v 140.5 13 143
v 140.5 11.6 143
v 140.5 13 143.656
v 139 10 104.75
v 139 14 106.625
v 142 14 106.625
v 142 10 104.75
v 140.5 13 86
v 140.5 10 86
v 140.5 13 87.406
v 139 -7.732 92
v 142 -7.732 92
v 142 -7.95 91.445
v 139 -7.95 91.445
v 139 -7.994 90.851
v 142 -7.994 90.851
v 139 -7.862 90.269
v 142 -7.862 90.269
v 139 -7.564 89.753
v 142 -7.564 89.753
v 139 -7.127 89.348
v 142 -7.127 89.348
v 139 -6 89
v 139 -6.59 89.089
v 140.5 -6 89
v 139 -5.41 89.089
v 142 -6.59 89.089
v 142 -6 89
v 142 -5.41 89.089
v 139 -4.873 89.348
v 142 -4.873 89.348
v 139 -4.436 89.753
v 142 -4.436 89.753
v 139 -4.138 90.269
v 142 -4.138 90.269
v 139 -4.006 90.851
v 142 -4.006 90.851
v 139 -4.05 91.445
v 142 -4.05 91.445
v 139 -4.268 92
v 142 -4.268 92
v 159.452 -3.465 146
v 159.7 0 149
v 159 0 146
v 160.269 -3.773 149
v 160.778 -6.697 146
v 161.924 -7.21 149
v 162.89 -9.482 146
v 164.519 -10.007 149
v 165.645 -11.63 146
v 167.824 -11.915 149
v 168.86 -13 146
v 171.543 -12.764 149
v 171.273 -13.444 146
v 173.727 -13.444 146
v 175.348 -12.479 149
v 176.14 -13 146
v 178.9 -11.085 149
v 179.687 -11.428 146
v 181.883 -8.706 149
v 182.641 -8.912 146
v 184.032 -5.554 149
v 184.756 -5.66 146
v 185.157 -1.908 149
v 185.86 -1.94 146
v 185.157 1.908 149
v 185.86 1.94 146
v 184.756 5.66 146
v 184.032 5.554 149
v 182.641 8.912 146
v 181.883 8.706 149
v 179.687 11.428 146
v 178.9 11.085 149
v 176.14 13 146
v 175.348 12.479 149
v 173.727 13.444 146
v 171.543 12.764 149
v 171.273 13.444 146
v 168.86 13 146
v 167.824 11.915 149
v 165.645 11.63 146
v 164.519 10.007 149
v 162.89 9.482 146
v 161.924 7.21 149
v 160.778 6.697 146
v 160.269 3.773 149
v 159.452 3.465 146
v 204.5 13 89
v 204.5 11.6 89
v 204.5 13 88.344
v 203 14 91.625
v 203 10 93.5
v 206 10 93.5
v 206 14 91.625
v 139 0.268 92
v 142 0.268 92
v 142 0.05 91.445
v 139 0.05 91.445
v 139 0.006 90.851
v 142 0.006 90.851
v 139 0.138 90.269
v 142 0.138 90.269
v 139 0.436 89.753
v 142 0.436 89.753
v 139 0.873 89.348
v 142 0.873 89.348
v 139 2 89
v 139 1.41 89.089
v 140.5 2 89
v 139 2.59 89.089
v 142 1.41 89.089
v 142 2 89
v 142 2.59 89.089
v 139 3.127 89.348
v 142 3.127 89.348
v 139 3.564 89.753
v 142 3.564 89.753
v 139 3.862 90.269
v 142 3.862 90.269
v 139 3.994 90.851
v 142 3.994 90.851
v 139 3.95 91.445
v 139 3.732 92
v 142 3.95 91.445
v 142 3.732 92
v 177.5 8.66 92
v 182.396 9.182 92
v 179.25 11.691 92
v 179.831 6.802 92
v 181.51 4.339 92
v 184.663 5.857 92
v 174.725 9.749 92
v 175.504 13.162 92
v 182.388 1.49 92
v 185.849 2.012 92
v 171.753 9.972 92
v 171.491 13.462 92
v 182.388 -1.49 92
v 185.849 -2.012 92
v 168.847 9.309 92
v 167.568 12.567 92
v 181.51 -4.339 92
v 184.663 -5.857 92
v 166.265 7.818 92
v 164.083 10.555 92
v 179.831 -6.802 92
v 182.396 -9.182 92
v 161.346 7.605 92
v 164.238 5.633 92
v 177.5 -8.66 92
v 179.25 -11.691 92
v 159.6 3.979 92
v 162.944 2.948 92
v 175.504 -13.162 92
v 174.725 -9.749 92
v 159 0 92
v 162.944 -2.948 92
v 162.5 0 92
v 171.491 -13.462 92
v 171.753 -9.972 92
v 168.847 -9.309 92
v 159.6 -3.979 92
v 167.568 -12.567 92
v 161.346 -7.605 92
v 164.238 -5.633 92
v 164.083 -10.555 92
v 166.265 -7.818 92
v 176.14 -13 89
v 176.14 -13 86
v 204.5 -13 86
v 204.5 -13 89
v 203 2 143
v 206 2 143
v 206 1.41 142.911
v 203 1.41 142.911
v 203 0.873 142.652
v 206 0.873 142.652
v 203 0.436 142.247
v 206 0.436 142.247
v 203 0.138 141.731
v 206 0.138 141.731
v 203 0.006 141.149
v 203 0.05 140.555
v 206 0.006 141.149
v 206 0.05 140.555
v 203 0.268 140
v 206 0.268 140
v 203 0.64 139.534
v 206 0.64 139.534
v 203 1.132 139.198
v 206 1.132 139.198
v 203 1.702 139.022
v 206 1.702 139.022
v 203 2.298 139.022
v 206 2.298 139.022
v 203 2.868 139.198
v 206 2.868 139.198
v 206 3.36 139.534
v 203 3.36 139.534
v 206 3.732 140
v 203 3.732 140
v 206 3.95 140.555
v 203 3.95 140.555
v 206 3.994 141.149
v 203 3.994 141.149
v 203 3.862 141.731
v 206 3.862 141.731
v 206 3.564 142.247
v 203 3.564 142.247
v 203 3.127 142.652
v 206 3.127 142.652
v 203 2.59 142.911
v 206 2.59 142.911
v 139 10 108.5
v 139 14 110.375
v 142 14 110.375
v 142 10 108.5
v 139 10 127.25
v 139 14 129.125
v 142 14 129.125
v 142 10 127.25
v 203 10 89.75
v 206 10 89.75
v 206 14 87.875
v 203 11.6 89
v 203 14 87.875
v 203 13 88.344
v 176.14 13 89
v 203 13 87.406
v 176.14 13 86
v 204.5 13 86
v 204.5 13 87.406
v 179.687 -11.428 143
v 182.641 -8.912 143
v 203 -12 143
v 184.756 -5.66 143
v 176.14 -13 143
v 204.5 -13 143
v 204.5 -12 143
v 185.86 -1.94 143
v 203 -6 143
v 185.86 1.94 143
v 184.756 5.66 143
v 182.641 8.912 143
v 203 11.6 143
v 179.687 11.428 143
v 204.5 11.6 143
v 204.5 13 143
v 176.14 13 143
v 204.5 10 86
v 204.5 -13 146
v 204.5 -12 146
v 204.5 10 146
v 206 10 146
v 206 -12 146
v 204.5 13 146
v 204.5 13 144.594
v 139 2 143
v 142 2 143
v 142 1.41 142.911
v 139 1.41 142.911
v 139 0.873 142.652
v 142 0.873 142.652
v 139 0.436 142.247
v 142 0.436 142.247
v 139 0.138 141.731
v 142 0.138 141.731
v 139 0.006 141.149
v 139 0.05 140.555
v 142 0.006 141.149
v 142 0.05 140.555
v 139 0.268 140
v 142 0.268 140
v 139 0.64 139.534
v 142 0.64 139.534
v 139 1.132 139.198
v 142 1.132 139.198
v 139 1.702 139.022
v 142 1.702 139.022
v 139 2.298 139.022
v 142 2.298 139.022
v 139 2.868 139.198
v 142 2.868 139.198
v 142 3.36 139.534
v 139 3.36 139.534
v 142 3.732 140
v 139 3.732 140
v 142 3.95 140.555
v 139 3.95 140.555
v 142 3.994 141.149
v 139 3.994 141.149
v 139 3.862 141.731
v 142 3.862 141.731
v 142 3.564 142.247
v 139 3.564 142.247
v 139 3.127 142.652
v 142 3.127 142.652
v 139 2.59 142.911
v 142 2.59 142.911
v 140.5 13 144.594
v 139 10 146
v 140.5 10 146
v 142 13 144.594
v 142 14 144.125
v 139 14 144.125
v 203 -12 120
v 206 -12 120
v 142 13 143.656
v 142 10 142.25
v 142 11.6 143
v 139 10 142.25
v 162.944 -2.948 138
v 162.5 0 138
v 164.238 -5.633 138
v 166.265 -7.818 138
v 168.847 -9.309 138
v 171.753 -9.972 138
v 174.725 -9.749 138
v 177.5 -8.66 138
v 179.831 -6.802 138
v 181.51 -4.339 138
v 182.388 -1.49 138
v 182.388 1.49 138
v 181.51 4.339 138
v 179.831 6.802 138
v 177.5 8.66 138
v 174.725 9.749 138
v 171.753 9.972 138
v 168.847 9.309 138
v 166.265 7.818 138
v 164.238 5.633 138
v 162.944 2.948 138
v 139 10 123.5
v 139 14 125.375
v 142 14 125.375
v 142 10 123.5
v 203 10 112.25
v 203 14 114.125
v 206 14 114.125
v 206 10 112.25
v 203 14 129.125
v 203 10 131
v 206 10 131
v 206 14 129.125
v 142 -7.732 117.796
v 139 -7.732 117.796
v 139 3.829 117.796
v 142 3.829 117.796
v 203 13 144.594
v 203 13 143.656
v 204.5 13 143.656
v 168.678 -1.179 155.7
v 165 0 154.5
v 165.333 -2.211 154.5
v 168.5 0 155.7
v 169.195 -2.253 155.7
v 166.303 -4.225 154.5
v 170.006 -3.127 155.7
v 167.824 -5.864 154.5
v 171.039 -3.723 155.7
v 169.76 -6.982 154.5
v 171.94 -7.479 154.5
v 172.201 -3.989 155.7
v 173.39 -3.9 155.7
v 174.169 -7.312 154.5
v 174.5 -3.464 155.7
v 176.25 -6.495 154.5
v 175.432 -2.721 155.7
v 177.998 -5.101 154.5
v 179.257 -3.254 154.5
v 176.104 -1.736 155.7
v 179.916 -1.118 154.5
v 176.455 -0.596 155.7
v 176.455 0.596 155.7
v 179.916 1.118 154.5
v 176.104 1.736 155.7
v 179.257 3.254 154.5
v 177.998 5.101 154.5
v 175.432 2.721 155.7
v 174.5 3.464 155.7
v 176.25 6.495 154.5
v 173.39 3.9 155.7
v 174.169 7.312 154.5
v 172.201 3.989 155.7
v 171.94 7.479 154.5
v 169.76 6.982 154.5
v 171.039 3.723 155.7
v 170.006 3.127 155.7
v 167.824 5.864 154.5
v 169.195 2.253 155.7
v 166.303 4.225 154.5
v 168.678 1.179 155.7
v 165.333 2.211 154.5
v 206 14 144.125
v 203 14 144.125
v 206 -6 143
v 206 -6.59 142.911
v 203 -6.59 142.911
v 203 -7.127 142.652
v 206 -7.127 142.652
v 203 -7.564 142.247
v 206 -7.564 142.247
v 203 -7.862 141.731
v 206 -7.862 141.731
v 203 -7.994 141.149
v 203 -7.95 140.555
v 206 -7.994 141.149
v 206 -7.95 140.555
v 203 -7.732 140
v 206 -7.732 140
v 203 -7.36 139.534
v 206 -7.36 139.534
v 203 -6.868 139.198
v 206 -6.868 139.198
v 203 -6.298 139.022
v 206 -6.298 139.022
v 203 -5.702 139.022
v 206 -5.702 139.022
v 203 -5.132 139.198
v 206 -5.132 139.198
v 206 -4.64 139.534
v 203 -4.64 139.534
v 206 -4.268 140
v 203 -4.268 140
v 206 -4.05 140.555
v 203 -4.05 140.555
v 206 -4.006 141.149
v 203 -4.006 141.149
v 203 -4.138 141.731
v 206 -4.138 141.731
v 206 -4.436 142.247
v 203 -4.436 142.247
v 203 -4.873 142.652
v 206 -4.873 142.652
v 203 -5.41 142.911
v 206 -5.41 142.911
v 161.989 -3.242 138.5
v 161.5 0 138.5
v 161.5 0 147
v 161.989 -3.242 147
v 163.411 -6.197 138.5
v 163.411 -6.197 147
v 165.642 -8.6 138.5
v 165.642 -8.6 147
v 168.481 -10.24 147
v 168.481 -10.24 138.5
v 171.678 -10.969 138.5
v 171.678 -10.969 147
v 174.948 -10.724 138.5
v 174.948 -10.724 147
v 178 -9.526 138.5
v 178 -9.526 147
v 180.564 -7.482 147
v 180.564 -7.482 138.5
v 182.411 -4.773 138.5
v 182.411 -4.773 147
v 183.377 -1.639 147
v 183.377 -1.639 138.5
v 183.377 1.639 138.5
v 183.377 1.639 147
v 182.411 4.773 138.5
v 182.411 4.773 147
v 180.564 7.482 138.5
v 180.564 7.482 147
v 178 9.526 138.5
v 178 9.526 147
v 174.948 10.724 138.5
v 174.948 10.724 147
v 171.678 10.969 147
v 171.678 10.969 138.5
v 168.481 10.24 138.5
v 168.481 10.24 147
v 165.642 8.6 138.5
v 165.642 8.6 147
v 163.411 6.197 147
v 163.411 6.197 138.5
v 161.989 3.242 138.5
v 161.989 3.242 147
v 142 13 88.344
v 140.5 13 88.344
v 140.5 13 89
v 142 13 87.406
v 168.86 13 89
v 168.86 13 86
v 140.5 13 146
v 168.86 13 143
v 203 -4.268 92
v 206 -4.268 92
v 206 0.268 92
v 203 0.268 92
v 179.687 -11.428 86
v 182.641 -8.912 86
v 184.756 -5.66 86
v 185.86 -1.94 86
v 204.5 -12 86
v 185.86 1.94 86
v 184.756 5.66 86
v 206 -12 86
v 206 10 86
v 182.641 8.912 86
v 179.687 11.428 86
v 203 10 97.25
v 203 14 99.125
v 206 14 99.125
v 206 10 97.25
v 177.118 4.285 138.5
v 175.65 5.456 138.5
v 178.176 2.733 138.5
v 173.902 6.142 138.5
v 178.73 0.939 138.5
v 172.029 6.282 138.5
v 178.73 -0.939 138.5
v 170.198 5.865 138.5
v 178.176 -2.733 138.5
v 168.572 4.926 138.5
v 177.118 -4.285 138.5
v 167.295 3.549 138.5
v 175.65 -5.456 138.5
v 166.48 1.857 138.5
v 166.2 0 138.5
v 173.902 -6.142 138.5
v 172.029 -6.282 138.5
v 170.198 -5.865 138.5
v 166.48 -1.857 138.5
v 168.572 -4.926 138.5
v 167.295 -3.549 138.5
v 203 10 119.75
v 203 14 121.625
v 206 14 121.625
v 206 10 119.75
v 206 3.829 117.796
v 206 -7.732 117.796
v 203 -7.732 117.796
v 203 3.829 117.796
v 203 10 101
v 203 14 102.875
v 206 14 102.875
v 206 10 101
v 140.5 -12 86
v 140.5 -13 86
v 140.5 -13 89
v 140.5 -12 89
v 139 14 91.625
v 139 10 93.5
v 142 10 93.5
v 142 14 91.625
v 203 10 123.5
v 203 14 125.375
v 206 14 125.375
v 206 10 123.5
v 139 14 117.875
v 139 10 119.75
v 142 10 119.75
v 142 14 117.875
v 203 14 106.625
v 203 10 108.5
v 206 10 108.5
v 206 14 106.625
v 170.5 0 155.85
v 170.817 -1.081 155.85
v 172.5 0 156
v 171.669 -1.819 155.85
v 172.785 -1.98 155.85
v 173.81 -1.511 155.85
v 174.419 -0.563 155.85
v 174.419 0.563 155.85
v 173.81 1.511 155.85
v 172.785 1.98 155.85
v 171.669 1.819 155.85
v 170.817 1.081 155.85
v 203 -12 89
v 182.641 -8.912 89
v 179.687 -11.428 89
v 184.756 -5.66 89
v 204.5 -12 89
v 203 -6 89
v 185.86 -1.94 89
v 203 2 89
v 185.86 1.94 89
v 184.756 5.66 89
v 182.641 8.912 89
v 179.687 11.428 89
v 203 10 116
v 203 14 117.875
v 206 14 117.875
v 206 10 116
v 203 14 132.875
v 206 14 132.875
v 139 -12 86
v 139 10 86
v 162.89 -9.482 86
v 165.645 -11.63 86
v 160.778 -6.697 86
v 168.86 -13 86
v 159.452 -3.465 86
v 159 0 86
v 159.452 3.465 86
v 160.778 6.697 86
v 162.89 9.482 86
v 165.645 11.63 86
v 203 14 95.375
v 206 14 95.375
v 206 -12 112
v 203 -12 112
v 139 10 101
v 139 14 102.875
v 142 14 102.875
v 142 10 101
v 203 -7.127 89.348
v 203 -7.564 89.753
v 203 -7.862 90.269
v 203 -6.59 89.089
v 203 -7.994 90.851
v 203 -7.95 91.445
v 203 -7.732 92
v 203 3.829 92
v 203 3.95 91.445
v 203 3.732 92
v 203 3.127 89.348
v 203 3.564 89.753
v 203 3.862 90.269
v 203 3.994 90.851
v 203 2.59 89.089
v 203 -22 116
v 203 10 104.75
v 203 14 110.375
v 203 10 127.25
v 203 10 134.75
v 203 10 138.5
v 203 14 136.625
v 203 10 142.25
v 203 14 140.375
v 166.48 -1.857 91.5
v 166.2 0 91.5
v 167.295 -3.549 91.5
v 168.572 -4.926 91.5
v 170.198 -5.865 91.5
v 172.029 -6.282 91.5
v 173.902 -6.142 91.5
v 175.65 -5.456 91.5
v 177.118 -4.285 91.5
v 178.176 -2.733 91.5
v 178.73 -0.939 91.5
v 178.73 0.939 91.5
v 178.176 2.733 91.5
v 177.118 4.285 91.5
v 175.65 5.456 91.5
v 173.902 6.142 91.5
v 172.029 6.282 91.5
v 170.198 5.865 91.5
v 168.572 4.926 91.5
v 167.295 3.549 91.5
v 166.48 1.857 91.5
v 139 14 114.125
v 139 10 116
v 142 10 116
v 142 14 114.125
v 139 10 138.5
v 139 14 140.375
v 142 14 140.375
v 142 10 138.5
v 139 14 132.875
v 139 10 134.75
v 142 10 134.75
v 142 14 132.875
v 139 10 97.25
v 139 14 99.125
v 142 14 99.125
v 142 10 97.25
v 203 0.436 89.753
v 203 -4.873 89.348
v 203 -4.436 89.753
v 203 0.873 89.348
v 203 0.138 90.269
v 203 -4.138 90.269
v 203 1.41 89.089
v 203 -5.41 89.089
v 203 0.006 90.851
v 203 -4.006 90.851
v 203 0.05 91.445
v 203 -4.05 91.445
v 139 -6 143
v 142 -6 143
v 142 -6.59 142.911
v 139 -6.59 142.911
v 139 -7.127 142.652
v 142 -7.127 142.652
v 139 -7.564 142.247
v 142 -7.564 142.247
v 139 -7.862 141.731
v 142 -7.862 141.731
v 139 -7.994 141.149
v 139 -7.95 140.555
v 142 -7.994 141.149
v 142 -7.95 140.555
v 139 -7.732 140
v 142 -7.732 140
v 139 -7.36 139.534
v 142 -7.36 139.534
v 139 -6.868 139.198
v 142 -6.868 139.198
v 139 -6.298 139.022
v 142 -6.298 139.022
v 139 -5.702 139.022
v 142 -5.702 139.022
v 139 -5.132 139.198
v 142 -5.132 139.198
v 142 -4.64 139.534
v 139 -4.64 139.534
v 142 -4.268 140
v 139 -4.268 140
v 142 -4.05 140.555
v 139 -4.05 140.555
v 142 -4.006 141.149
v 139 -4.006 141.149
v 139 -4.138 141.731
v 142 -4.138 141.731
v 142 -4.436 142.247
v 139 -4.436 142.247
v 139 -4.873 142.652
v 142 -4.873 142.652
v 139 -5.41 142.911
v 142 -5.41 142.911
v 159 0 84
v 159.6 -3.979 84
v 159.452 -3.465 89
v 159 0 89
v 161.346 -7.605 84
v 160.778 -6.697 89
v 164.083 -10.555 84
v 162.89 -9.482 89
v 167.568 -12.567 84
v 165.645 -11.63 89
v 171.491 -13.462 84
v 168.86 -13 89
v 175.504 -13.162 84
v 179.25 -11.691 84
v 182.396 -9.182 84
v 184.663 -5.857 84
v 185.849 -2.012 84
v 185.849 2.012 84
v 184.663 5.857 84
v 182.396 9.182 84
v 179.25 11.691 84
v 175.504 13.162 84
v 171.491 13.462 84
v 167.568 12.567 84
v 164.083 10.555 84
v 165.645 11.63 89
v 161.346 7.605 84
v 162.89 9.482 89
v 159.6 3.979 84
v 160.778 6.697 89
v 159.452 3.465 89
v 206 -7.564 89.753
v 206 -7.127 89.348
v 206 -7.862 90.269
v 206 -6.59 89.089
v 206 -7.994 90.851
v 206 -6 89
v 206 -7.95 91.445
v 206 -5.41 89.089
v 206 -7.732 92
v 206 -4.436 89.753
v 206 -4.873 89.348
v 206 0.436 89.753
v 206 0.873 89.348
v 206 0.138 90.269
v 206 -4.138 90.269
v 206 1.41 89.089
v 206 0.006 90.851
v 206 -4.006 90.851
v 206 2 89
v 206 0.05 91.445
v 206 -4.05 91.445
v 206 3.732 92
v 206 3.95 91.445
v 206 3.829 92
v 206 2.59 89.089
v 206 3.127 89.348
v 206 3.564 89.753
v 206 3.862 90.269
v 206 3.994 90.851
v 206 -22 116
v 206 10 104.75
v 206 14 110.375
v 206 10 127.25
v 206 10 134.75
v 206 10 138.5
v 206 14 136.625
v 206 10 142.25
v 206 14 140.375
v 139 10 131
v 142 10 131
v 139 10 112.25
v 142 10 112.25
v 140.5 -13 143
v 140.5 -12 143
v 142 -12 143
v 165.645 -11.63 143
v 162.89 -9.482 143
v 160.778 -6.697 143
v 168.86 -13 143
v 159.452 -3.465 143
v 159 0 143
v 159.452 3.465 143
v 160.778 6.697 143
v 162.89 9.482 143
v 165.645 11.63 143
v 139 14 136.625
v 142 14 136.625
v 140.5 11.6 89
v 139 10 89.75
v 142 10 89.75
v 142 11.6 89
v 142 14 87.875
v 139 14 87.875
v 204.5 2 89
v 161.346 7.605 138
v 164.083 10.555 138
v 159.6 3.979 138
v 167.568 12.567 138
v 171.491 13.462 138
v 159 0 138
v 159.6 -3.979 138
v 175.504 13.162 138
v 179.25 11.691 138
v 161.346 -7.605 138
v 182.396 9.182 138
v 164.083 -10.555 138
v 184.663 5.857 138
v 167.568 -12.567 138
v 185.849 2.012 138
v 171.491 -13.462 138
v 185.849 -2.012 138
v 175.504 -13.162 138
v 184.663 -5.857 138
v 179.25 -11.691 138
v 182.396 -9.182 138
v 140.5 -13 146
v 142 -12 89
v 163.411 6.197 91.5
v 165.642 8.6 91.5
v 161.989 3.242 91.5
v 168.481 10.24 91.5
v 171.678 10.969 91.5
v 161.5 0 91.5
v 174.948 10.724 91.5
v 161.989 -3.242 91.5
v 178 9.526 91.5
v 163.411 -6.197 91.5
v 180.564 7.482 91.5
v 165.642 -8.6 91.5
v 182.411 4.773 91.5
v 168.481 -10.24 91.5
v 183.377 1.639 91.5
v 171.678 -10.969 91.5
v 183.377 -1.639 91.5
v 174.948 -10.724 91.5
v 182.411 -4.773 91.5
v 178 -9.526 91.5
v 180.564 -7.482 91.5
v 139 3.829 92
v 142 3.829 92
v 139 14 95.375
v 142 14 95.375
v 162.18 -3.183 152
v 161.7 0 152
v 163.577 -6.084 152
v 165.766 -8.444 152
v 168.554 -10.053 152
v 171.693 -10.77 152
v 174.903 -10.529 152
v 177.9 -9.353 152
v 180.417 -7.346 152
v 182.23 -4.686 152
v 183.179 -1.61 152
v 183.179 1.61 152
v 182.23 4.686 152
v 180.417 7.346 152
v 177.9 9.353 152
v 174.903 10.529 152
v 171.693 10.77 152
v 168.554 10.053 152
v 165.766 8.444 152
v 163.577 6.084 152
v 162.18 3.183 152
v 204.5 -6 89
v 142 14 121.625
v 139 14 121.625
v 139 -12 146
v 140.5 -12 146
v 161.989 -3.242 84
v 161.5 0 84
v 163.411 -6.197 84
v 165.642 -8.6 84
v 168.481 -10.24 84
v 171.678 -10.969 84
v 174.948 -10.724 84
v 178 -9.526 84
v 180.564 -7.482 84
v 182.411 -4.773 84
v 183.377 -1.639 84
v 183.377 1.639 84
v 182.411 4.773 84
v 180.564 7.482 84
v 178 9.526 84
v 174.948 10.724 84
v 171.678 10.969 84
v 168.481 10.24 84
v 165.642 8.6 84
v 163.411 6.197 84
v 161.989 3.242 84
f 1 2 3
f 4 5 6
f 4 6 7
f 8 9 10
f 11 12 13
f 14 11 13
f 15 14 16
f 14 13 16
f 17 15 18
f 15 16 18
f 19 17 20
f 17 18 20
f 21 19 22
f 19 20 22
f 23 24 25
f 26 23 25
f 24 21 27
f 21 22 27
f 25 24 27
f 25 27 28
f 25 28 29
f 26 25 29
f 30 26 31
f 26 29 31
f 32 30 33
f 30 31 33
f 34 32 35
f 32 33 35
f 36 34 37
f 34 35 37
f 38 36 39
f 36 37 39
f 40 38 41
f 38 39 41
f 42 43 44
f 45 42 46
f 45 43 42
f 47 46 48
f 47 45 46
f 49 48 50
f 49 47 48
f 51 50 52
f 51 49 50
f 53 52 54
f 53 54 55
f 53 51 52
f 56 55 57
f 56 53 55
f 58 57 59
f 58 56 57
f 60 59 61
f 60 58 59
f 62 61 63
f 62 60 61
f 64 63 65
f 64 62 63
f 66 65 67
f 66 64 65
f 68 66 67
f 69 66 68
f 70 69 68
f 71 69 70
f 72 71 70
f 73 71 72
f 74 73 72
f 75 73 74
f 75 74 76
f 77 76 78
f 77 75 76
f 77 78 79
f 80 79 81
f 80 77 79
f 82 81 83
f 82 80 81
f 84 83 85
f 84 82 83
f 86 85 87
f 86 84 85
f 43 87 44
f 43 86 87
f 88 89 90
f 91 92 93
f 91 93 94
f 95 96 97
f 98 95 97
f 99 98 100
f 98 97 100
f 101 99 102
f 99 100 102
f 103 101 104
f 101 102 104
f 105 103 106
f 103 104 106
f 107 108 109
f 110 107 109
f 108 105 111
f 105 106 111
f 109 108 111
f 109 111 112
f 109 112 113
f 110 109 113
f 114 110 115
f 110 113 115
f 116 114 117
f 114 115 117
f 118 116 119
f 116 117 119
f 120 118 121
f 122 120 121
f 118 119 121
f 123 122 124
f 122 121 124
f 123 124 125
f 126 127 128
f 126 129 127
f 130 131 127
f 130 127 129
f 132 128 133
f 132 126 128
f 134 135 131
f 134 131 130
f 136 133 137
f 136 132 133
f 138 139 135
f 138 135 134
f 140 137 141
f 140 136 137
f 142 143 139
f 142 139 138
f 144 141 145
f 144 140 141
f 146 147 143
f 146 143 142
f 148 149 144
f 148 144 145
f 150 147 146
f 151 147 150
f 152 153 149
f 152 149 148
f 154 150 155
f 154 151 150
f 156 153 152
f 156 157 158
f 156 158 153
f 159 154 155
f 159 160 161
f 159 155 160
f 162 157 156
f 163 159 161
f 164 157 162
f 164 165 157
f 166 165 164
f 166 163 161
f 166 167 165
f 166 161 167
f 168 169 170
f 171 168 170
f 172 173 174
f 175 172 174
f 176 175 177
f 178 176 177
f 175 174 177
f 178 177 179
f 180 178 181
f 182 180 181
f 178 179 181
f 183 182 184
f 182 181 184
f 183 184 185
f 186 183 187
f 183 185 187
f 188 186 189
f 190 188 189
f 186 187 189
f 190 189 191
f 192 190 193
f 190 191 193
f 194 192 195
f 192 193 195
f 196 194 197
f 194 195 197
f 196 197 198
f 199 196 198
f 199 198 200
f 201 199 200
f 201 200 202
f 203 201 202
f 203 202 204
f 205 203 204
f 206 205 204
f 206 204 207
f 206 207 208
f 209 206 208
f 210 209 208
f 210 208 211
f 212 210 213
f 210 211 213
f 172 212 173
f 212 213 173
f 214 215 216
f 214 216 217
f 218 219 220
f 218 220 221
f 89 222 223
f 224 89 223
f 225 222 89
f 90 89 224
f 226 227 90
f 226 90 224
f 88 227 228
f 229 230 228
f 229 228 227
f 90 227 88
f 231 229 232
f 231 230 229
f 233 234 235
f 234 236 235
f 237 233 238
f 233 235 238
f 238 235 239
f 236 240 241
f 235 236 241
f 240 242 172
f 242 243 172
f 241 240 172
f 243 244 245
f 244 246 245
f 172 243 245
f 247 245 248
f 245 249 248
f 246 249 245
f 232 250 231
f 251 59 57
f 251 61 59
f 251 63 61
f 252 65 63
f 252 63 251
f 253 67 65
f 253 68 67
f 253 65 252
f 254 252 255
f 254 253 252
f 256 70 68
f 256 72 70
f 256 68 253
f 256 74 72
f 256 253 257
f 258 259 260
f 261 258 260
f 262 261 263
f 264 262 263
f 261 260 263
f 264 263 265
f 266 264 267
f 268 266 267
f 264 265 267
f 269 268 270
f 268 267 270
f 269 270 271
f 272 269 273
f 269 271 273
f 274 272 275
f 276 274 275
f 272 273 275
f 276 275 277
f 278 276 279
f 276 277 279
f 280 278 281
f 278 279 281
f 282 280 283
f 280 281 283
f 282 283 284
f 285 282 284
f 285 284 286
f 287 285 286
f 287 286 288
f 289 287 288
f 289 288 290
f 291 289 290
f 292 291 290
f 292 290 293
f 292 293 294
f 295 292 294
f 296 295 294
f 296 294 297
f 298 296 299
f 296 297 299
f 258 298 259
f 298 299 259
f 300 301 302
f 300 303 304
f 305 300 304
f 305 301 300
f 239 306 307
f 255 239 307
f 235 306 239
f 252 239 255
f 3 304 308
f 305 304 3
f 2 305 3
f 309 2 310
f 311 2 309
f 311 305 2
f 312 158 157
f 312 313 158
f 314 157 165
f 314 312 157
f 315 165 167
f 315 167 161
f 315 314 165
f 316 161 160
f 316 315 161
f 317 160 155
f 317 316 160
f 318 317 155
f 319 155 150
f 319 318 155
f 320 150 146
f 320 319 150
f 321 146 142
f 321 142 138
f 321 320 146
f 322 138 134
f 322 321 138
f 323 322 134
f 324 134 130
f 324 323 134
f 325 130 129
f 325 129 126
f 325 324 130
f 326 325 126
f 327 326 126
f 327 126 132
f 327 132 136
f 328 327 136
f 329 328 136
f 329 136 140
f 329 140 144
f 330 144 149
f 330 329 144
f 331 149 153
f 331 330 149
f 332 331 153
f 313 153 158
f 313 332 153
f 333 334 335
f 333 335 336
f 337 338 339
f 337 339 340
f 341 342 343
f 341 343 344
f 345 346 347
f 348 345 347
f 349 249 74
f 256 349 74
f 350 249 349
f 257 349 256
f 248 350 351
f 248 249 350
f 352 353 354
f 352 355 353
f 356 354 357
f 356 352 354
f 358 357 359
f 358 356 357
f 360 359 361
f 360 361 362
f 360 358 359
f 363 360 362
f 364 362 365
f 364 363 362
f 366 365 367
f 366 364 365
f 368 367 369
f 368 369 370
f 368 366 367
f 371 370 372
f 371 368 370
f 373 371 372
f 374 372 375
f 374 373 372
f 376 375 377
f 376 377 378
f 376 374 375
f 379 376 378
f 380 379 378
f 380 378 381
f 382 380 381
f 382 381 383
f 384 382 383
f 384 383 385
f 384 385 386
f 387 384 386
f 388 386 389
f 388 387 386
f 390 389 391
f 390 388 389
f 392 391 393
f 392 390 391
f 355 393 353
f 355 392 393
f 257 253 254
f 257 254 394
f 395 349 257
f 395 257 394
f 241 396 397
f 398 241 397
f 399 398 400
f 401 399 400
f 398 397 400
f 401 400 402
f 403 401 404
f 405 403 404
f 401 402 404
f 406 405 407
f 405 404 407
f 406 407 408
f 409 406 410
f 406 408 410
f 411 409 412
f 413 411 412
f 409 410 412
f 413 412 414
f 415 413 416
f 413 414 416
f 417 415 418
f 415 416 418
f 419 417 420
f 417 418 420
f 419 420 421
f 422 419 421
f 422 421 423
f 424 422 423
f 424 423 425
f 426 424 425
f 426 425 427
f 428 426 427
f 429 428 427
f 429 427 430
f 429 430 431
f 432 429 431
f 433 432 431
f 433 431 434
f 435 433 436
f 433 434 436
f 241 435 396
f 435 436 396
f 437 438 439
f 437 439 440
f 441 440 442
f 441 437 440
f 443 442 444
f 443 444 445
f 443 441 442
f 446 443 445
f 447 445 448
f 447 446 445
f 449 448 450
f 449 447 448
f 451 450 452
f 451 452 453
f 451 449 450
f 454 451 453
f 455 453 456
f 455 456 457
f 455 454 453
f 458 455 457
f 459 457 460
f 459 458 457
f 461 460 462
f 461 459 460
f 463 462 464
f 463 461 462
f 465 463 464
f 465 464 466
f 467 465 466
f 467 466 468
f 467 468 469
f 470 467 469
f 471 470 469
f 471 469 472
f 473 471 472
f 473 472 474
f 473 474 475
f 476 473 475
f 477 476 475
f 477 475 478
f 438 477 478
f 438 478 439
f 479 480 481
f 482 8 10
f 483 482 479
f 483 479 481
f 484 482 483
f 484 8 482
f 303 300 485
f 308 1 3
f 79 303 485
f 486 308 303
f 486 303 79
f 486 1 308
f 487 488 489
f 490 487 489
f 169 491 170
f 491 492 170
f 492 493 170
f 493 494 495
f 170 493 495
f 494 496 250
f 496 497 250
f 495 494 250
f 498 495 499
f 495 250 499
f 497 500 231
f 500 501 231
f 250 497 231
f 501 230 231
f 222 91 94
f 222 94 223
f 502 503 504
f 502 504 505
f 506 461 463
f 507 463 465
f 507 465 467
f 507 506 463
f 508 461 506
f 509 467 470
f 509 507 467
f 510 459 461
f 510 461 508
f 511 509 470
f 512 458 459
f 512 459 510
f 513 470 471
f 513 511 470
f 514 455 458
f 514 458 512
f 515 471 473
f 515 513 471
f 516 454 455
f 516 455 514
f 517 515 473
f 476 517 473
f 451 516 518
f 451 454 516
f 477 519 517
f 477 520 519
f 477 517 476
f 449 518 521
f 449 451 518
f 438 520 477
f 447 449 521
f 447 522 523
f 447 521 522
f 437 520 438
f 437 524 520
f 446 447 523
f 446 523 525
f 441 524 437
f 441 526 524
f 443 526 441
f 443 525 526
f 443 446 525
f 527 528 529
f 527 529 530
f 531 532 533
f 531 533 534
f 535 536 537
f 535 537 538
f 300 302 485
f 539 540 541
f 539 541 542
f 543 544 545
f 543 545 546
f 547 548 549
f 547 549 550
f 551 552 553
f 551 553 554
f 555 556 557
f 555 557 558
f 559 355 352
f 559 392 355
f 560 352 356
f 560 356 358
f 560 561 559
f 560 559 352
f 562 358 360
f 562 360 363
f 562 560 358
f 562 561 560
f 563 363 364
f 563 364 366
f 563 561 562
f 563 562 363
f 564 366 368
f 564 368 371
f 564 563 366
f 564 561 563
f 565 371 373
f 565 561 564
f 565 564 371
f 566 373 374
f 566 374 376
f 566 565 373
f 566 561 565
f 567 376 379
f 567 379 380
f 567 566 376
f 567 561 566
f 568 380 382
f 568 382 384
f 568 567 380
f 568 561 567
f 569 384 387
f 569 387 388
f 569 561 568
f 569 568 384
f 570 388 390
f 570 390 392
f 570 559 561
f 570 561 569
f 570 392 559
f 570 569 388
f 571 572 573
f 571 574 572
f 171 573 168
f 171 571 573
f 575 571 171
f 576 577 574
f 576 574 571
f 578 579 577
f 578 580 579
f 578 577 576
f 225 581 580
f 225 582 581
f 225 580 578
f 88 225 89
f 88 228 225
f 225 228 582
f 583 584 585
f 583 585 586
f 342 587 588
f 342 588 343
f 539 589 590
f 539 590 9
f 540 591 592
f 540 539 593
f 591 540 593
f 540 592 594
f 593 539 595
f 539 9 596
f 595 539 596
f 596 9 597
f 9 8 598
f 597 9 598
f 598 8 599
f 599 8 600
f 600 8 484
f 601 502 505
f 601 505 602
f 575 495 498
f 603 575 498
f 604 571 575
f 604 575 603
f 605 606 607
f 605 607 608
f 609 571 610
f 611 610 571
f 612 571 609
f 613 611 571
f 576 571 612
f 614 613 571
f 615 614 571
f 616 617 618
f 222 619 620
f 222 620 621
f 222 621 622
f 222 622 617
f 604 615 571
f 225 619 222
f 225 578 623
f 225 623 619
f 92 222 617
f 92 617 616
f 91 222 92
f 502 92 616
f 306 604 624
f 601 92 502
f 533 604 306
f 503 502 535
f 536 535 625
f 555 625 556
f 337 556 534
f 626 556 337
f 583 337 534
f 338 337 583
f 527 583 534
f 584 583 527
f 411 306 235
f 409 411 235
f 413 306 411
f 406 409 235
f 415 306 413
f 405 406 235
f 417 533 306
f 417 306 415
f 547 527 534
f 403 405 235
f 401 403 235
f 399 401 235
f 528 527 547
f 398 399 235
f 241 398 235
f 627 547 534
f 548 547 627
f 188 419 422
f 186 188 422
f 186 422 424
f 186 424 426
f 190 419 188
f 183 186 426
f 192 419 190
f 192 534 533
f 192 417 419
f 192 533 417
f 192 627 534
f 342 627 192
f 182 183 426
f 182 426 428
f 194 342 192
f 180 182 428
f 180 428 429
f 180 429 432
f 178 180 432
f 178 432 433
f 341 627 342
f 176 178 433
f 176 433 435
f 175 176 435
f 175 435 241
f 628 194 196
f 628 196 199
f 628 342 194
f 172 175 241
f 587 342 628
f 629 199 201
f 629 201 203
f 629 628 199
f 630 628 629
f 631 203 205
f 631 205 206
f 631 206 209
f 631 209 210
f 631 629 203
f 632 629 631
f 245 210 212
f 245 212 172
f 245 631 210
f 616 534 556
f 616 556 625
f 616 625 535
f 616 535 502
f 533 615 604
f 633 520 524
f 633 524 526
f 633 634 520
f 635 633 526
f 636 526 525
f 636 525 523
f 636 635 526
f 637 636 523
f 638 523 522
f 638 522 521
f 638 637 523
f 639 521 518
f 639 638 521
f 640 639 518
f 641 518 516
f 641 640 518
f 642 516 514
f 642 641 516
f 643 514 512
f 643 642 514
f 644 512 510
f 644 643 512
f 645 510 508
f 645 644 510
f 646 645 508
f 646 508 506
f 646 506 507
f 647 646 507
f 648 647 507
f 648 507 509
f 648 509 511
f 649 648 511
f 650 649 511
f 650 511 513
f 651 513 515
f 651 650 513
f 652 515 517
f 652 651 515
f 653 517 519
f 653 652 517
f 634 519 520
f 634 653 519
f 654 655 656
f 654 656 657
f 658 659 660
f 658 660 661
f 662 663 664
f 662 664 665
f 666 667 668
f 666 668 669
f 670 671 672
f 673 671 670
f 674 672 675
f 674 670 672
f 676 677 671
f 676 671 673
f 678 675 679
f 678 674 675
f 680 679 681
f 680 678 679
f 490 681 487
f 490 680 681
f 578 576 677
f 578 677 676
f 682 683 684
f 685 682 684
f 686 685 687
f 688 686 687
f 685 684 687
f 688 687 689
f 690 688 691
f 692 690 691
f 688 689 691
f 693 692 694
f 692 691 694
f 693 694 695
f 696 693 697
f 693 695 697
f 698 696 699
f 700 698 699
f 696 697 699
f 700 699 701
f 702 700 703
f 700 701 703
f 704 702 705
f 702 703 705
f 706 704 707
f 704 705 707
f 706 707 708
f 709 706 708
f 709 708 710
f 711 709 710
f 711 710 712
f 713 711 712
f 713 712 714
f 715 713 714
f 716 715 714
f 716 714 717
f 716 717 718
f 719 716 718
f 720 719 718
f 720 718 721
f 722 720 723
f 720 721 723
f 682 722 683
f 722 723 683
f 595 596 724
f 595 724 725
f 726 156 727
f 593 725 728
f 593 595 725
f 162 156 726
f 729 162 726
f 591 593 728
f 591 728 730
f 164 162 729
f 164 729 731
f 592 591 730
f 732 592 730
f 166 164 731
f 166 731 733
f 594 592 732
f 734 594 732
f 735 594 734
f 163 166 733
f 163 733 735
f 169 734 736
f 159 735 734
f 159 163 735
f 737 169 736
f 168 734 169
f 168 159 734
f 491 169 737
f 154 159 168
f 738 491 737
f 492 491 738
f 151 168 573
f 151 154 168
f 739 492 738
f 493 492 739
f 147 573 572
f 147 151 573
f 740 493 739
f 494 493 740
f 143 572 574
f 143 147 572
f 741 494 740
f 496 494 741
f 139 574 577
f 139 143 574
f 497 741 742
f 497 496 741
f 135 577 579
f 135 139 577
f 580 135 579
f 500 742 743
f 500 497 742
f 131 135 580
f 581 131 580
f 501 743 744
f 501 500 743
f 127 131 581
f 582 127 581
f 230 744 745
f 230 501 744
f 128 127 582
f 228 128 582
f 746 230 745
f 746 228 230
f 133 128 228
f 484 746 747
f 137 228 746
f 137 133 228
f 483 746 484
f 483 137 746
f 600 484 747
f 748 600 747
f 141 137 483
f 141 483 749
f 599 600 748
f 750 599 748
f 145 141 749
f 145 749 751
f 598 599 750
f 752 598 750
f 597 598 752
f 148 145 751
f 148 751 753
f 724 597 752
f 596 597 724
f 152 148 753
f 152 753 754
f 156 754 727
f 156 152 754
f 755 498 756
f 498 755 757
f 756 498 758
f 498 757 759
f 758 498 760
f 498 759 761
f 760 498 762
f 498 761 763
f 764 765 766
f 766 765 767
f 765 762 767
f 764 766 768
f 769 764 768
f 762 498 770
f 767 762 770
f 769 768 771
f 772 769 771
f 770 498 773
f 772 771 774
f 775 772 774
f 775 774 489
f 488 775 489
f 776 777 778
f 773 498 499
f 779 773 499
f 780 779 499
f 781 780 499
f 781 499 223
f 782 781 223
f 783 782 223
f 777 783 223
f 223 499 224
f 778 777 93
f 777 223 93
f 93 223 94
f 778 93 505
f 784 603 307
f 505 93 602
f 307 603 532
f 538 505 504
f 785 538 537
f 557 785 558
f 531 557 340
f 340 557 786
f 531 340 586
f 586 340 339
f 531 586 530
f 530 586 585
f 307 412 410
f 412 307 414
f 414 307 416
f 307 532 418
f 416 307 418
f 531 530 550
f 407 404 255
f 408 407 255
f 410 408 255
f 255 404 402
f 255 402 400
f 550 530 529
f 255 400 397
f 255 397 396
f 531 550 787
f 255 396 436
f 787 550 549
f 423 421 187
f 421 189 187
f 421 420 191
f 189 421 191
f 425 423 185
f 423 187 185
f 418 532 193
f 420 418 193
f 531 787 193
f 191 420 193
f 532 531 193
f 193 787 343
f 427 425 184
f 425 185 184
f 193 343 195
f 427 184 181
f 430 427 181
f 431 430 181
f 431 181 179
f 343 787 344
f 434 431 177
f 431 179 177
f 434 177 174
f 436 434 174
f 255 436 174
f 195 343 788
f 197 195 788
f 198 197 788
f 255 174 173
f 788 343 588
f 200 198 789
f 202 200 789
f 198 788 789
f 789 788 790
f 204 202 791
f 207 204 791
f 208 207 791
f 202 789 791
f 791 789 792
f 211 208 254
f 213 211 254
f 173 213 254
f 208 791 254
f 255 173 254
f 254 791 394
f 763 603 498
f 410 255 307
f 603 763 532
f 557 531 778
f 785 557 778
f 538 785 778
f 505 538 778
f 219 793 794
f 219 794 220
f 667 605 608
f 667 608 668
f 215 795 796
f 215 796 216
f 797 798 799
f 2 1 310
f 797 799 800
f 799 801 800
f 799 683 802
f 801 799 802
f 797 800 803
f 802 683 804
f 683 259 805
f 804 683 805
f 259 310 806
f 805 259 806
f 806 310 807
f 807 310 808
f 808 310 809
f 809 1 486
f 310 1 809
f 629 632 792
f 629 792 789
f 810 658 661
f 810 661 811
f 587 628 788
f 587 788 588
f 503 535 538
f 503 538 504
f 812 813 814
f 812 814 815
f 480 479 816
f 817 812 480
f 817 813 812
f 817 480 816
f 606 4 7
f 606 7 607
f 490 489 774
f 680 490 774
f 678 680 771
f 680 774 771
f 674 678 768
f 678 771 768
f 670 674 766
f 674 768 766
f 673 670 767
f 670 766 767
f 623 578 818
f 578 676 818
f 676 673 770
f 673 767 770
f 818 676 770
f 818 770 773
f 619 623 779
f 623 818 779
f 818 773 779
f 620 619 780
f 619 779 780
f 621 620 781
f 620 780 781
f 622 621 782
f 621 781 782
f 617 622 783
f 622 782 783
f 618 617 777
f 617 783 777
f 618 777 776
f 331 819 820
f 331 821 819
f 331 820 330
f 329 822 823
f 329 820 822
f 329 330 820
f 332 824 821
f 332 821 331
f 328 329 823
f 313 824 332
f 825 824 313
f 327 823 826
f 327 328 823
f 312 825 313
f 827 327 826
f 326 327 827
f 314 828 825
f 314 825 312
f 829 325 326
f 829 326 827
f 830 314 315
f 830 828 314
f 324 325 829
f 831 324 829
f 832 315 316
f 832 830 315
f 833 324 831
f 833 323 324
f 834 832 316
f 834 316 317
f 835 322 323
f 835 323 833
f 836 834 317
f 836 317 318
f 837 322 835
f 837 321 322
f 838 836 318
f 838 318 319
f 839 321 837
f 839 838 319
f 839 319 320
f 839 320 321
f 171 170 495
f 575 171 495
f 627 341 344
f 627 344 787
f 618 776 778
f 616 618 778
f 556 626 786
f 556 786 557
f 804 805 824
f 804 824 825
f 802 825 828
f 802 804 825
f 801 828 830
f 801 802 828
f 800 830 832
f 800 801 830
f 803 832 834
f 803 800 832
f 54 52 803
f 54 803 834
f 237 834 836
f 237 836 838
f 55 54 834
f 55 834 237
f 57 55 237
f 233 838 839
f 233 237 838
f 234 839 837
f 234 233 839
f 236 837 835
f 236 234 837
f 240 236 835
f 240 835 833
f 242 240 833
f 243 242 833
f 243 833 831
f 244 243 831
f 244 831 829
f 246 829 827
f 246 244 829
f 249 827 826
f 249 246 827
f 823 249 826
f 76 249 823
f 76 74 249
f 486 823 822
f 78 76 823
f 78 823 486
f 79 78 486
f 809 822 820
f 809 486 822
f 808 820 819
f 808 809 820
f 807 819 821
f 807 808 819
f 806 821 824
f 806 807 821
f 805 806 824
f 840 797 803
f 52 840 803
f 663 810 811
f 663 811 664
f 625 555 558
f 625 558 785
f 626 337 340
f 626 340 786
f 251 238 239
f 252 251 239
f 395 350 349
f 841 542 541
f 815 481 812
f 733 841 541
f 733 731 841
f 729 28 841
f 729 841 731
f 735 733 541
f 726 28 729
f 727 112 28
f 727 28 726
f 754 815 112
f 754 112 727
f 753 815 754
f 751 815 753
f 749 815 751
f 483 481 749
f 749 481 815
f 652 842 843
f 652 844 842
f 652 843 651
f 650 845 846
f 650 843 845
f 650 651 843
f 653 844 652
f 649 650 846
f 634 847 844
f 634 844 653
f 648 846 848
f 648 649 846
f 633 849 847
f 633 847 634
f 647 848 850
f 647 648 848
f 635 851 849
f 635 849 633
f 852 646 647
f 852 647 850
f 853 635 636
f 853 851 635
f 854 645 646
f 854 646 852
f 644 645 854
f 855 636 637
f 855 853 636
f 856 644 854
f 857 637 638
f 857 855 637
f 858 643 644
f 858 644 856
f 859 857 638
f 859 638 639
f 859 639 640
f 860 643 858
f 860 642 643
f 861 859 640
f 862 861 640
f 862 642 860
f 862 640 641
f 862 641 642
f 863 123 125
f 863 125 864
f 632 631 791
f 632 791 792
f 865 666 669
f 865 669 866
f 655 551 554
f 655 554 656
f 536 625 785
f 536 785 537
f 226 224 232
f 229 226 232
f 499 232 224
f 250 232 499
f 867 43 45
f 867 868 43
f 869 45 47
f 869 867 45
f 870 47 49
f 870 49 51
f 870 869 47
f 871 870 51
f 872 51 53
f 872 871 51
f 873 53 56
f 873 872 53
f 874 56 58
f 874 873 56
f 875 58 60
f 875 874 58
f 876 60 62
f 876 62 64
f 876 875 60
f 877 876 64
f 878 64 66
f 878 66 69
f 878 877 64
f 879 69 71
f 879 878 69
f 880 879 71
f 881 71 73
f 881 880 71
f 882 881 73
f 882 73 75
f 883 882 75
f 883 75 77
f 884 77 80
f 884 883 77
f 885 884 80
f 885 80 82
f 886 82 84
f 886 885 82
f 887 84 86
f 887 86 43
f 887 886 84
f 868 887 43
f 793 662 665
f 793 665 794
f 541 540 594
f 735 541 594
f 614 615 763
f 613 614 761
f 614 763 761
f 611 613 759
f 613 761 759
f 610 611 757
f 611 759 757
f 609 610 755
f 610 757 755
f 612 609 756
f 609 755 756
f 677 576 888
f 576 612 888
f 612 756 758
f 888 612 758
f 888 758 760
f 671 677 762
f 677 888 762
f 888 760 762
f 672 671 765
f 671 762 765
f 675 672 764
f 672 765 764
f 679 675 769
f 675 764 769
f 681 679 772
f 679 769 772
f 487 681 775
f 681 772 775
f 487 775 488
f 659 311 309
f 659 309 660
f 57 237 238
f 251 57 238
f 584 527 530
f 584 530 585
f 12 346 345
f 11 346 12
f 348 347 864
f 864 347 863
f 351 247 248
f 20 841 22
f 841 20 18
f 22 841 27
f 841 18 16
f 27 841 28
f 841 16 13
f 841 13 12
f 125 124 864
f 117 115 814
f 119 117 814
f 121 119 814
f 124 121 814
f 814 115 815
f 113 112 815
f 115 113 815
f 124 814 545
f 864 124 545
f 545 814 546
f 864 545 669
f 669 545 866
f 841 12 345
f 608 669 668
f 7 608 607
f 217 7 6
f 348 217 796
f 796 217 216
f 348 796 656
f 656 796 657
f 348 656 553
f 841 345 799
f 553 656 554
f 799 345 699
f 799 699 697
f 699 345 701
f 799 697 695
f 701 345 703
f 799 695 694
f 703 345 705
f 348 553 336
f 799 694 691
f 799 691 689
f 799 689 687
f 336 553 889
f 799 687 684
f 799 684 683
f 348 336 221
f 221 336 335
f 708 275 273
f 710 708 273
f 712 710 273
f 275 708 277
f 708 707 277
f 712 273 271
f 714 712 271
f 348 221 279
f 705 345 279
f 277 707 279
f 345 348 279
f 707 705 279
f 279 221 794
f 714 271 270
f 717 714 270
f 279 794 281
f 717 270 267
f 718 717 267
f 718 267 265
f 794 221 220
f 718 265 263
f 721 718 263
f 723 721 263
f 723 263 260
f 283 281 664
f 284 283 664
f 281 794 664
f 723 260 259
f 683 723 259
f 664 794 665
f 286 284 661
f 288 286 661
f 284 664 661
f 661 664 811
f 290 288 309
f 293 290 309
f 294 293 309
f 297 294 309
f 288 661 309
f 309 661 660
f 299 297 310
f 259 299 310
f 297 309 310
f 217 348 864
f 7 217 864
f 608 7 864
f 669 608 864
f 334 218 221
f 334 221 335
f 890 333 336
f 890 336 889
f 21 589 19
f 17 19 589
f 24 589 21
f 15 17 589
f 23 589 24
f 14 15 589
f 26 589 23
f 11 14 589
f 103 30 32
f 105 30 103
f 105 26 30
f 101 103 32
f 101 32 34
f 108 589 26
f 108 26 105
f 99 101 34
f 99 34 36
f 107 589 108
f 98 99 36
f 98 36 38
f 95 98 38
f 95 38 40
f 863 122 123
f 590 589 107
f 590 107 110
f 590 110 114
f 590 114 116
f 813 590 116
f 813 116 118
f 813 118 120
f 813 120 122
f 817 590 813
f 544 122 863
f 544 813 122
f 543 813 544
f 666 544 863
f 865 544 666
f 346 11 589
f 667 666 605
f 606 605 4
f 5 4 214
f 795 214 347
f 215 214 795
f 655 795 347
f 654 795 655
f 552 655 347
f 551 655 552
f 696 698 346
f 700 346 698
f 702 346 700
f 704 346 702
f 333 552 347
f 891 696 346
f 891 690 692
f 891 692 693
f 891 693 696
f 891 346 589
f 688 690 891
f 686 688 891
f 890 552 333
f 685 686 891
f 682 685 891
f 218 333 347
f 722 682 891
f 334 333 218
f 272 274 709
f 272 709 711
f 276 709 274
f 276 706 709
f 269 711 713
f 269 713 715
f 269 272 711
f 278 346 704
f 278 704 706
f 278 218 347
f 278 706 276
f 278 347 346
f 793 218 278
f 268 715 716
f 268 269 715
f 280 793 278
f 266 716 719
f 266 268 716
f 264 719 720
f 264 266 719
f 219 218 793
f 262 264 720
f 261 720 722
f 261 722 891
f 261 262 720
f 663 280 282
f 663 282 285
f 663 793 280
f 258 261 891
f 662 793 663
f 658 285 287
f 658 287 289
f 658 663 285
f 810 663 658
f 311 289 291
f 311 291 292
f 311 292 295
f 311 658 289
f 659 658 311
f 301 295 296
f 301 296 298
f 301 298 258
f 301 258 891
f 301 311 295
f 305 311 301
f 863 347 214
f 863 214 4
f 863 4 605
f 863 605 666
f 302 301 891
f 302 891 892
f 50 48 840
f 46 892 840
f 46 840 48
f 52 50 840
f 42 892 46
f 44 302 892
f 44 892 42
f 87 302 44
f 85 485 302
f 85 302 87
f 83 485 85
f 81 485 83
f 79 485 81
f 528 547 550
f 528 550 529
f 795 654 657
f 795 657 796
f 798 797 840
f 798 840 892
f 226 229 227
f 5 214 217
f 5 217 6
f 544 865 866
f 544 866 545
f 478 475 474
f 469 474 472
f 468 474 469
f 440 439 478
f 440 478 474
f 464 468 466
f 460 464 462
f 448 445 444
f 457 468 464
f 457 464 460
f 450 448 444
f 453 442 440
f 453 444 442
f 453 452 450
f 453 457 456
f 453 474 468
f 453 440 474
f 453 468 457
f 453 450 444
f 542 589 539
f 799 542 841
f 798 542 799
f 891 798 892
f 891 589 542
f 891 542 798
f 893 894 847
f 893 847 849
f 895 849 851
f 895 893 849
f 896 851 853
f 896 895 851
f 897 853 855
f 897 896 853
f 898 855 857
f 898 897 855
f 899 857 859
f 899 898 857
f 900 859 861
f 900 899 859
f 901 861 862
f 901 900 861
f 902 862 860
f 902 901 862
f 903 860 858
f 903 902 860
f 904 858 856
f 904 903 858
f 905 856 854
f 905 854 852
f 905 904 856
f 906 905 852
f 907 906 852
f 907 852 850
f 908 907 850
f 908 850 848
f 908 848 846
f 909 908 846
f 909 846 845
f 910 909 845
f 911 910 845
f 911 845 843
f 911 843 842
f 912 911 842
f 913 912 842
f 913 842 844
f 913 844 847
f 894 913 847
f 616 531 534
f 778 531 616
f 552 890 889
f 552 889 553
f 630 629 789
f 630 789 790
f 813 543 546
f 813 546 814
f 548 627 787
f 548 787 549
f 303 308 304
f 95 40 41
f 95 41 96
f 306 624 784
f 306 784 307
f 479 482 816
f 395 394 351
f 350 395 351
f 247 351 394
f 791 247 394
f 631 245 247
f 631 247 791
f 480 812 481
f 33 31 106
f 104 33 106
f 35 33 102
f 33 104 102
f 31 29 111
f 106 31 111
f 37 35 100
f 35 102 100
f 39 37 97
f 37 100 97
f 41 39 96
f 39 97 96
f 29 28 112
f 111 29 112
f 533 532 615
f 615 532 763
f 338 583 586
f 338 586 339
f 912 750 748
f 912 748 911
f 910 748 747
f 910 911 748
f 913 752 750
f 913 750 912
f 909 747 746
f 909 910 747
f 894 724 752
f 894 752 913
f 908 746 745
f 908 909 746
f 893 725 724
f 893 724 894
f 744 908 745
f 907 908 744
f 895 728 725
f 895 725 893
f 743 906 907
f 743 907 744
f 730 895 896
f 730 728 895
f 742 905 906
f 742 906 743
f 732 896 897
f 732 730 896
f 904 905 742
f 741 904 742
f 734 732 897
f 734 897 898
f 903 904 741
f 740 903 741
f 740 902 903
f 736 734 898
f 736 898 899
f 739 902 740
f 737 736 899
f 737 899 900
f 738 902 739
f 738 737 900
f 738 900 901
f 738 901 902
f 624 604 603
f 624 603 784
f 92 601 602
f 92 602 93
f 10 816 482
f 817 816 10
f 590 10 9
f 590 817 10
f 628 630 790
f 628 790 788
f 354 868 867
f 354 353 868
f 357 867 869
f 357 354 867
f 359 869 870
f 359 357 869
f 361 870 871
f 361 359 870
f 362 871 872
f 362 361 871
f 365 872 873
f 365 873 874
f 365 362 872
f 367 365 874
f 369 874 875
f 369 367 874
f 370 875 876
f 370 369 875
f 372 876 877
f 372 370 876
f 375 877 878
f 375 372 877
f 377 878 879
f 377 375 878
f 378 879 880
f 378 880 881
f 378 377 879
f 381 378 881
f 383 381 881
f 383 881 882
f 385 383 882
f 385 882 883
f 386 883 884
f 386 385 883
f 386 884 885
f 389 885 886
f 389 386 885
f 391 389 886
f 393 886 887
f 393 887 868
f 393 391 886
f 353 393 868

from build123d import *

# Parameters (mm, degrees)
PLACA_DELANTERA_START               = 203
PLACA_DELANTERA_DEPTH               = 3
AGUJERO_PLACA_DELANTERA_1_PROFILE_R = 2
AGUJERO_PLACA_DELANTERA_2_PROFILE_R = 2
AGUJERO_PLACA_DELANTERA_3_PROFILE_R = 2
AGUJERO_PLACA_DELANTERA_4_PROFILE_R = 2
PLACA_TRASERA_START                 = 139
PLACA_TRASERA_DEPTH                 = 3
AGUJERO_PLACA_TRASERA_1_PROFILE_R   = 2
AGUJERO_PLACA_TRASERA_2_PROFILE_R   = 2
AGUJERO_PLACA_TRASERA_3_PROFILE_R   = 2
AGUJERO_PLACA_TRASERA_4_PROFILE_R   = 2
MARCO_INTERIOR_START                = 86
SK_MARCO_INTERIOR_W                 = 64
SK_MARCO_INTERIOR_H                 = 26
SK_MARCO_INTERIOR_R                 = 11
MARCO_INTERIOR_DEPTH                = 3
MARCO_EXTERIOR_START                = 143
SK_MARCO_EXTERIOR_W                 = 64
SK_MARCO_EXTERIOR_H                 = 26
SK_MARCO_EXTERIOR_R                 = 11
MARCO_EXTERIOR_DEPTH                = 3
CROQUIS17_W                         = 25.795648089
CROQUIS17_H                         = 11.561302328
CORTAR_EXTRUIR1_DEPTH               = 10


with BuildPart() as part:
    # Sk_Eje_cuerpo → Eje_cuerpo (revolve)
    with BuildSketch(Plane(origin=(0, 0, 0), x_dir=(1, 0, 0), z_dir=(0, 1, 0))):
        Polygon((183.5, -84), (186, -84), (186, -92), (182.5, -92), (182.5, -138), (186, -138), (186, -146), (185.3, -149), (183.3, -152), (180, -154.5), (176.5, -155.7), (172.5, -156), (172.5, -147), (183.5, -147), (183.5, -138.5), (178.8, -138.5), (178.8, -91.5), (183.5, -91.5), align=None)
    revolve(axis=Axis((172.5, 0, 62.1), (0, 0, 1)))



with BuildPart() as body_2:
    # Sk_Placa_delantera → Placa_delantera (new body)
    with BuildSketch(Plane(origin=(0, 0, 0), x_dir=(0, 0, -1), z_dir=(1, 0, 0)).offset(PLACA_DELANTERA_START)):
        Polygon((-86, -12), (-112, -12), (-116, -22), (-120, -12), (-146, -12), (-146, 10), (-144.125, 14), (-142.25, 10), (-140.375, 14), (-138.5, 10), (-136.625, 14), (-134.75, 10), (-132.875, 14), (-131, 10), (-129.125, 14), (-127.25, 10), (-125.375, 14), (-123.5, 10), (-121.625, 14), (-119.75, 10), (-117.875, 14), (-116, 10), (-114.125, 14), (-112.25, 10), (-110.375, 14), (-108.5, 10), (-106.625, 14), (-104.75, 10), (-102.875, 14), (-101, 10), (-99.125, 14), (-97.25, 10), (-95.375, 14), (-93.5, 10), (-91.625, 14), (-89.75, 10), (-87.875, 14), (-86, 10), align=None)
    extrude(amount=PLACA_DELANTERA_DEPTH)

    # Agujero_Placa_delantera_1: sweep along a curve in space
    with BuildLine() as agujero_placa_delantera_1_path:
        Line((201.5, -6, 91), (207.5, -6, 91))
    # Agujero_Placa_delantera_1 profile (on start of the path) → Agujero_Placa_delantera_1 (sweep, cut)
    with BuildSketch(Plane(origin=(201.5, -6, 91), x_dir=(0, 0, 1), z_dir=(1, 0, 0))):
        Circle(AGUJERO_PLACA_DELANTERA_1_PROFILE_R)
    sweep(path=agujero_placa_delantera_1_path.line, mode=Mode.SUBTRACT)

    # Agujero_Placa_delantera_2: sweep along a curve in space
    with BuildLine() as agujero_placa_delantera_2_path:
        Line((201.5, 2, 91), (207.5, 2, 91))
    # Agujero_Placa_delantera_2 profile (on start of the path) → Agujero_Placa_delantera_2 (sweep, cut)
    with BuildSketch(Plane(origin=(201.5, 2, 91), x_dir=(0, 0, 1), z_dir=(1, 0, 0))):
        Circle(AGUJERO_PLACA_DELANTERA_2_PROFILE_R)
    sweep(path=agujero_placa_delantera_2_path.line, mode=Mode.SUBTRACT)

    # Agujero_Placa_delantera_3: sweep along a curve in space
    with BuildLine() as agujero_placa_delantera_3_path:
        Line((201.5, -6, 141), (207.5, -6, 141))
    # Agujero_Placa_delantera_3 profile (on start of the path) → Agujero_Placa_delantera_3 (sweep, cut)
    with BuildSketch(Plane(origin=(201.5, -6, 141), x_dir=(0, 0, 1), z_dir=(1, 0, 0))):
        Circle(AGUJERO_PLACA_DELANTERA_3_PROFILE_R)
    sweep(path=agujero_placa_delantera_3_path.line, mode=Mode.SUBTRACT)

    # Agujero_Placa_delantera_4: sweep along a curve in space
    with BuildLine() as agujero_placa_delantera_4_path:
        Line((201.5, 2, 141), (207.5, 2, 141))
    # Agujero_Placa_delantera_4 profile (on start of the path) → Agujero_Placa_delantera_4 (sweep, cut)
    with BuildSketch(Plane(origin=(201.5, 2, 141), x_dir=(0, 0, 1), z_dir=(1, 0, 0))):
        Circle(AGUJERO_PLACA_DELANTERA_4_PROFILE_R)
    sweep(path=agujero_placa_delantera_4_path.line, mode=Mode.SUBTRACT)


with BuildPart() as body_3:
    # Sk_Placa_trasera → Placa_trasera (new body)
    with BuildSketch(Plane(origin=(0, 0, 0), x_dir=(0, 0, -1), z_dir=(1, 0, 0)).offset(PLACA_TRASERA_START)):
        Polygon((-86, -12), (-146, -12), (-146, 10), (-144.125, 14), (-142.25, 10), (-140.375, 14), (-138.5, 10), (-136.625, 14), (-134.75, 10), (-132.875, 14), (-131, 10), (-129.125, 14), (-127.25, 10), (-125.375, 14), (-123.5, 10), (-121.625, 14), (-119.75, 10), (-117.875, 14), (-116, 10), (-114.125, 14), (-112.25, 10), (-110.375, 14), (-108.5, 10), (-106.625, 14), (-104.75, 10), (-102.875, 14), (-101, 10), (-99.125, 14), (-97.25, 10), (-95.375, 14), (-93.5, 10), (-91.625, 14), (-89.75, 10), (-87.875, 14), (-86, 10), align=None)
    extrude(amount=PLACA_TRASERA_DEPTH)

    # Agujero_Placa_trasera_1: sweep along a curve in space
    with BuildLine() as agujero_placa_trasera_1_path:
        Line((137.5, -6, 91), (143.5, -6, 91))
    # Agujero_Placa_trasera_1 profile (on start of the path) → Agujero_Placa_trasera_1 (sweep, cut)
    with BuildSketch(Plane(origin=(137.5, -6, 91), x_dir=(0, 0, 1), z_dir=(1, 0, 0))):
        Circle(AGUJERO_PLACA_TRASERA_1_PROFILE_R)
    sweep(path=agujero_placa_trasera_1_path.line, mode=Mode.SUBTRACT)

    # Agujero_Placa_trasera_2: sweep along a curve in space
    with BuildLine() as agujero_placa_trasera_2_path:
        Line((137.5, 2, 91), (143.5, 2, 91))
    # Agujero_Placa_trasera_2 profile (on start of the path) → Agujero_Placa_trasera_2 (sweep, cut)
    with BuildSketch(Plane(origin=(137.5, 2, 91), x_dir=(0, 0, 1), z_dir=(1, 0, 0))):
        Circle(AGUJERO_PLACA_TRASERA_2_PROFILE_R)
    sweep(path=agujero_placa_trasera_2_path.line, mode=Mode.SUBTRACT)

    # Agujero_Placa_trasera_3: sweep along a curve in space
    with BuildLine() as agujero_placa_trasera_3_path:
        Line((137.5, -6, 141), (143.5, -6, 141))
    # Agujero_Placa_trasera_3 profile (on start of the path) → Agujero_Placa_trasera_3 (sweep, cut)
    with BuildSketch(Plane(origin=(137.5, -6, 141), x_dir=(0, 0, 1), z_dir=(1, 0, 0))):
        Circle(AGUJERO_PLACA_TRASERA_3_PROFILE_R)
    sweep(path=agujero_placa_trasera_3_path.line, mode=Mode.SUBTRACT)

    # Agujero_Placa_trasera_4: sweep along a curve in space
    with BuildLine() as agujero_placa_trasera_4_path:
        Line((137.5, 2, 141), (143.5, 2, 141))
    # Agujero_Placa_trasera_4 profile (on start of the path) → Agujero_Placa_trasera_4 (sweep, cut)
    with BuildSketch(Plane(origin=(137.5, 2, 141), x_dir=(0, 0, 1), z_dir=(1, 0, 0))):
        Circle(AGUJERO_PLACA_TRASERA_4_PROFILE_R)
    sweep(path=agujero_placa_trasera_4_path.line, mode=Mode.SUBTRACT)


with BuildPart() as part_1:
    add(part.part)

    add(body_2.part)  # Marco_interior merges body 2

    add(body_3.part)  # Marco_interior merges body 3
    # Sk_Marco_interior → Marco_interior (add)
    with BuildSketch(Plane.XY.offset(MARCO_INTERIOR_START)):
        with Locations((172.5, 0)):
            Rectangle(SK_MARCO_INTERIOR_W, SK_MARCO_INTERIOR_H)
        with Locations((172.5, 0)):
            Circle(SK_MARCO_INTERIOR_R, mode=Mode.SUBTRACT)
    extrude(amount=MARCO_INTERIOR_DEPTH)

    # Sk_Marco_exterior → Marco_exterior (add)
    with BuildSketch(Plane.XY.offset(MARCO_EXTERIOR_START)):
        with Locations((172.5, 0)):
            Rectangle(SK_MARCO_EXTERIOR_W, SK_MARCO_EXTERIOR_H)
        with Locations((172.5, 0)):
            Circle(SK_MARCO_EXTERIOR_R, mode=Mode.SUBTRACT)
    extrude(amount=MARCO_EXTERIOR_DEPTH)

    # Croquis17 → Cortar-Extruir1 (cut)
    with BuildSketch(Plane(origin=(206, 0, 0), x_dir=(0, 0, -1), z_dir=(1, 0, 0))):
        with Locations((-104.897824044, -1.951399644)):
            Rectangle(CROQUIS17_W, CROQUIS17_H)
    cortar_extruir1 = extrude(amount=-CORTAR_EXTRUIR1_DEPTH, mode=Mode.SUBTRACT)

    # Simetría1: Cortar-Extruir1 across plane
    add(cortar_extruir1.mirror(Plane(origin=(172, 0, 0), x_dir=(0, 0, 1), z_dir=(1, 0, 0))), mode=Mode.SUBTRACT)


solid = part_1.part
